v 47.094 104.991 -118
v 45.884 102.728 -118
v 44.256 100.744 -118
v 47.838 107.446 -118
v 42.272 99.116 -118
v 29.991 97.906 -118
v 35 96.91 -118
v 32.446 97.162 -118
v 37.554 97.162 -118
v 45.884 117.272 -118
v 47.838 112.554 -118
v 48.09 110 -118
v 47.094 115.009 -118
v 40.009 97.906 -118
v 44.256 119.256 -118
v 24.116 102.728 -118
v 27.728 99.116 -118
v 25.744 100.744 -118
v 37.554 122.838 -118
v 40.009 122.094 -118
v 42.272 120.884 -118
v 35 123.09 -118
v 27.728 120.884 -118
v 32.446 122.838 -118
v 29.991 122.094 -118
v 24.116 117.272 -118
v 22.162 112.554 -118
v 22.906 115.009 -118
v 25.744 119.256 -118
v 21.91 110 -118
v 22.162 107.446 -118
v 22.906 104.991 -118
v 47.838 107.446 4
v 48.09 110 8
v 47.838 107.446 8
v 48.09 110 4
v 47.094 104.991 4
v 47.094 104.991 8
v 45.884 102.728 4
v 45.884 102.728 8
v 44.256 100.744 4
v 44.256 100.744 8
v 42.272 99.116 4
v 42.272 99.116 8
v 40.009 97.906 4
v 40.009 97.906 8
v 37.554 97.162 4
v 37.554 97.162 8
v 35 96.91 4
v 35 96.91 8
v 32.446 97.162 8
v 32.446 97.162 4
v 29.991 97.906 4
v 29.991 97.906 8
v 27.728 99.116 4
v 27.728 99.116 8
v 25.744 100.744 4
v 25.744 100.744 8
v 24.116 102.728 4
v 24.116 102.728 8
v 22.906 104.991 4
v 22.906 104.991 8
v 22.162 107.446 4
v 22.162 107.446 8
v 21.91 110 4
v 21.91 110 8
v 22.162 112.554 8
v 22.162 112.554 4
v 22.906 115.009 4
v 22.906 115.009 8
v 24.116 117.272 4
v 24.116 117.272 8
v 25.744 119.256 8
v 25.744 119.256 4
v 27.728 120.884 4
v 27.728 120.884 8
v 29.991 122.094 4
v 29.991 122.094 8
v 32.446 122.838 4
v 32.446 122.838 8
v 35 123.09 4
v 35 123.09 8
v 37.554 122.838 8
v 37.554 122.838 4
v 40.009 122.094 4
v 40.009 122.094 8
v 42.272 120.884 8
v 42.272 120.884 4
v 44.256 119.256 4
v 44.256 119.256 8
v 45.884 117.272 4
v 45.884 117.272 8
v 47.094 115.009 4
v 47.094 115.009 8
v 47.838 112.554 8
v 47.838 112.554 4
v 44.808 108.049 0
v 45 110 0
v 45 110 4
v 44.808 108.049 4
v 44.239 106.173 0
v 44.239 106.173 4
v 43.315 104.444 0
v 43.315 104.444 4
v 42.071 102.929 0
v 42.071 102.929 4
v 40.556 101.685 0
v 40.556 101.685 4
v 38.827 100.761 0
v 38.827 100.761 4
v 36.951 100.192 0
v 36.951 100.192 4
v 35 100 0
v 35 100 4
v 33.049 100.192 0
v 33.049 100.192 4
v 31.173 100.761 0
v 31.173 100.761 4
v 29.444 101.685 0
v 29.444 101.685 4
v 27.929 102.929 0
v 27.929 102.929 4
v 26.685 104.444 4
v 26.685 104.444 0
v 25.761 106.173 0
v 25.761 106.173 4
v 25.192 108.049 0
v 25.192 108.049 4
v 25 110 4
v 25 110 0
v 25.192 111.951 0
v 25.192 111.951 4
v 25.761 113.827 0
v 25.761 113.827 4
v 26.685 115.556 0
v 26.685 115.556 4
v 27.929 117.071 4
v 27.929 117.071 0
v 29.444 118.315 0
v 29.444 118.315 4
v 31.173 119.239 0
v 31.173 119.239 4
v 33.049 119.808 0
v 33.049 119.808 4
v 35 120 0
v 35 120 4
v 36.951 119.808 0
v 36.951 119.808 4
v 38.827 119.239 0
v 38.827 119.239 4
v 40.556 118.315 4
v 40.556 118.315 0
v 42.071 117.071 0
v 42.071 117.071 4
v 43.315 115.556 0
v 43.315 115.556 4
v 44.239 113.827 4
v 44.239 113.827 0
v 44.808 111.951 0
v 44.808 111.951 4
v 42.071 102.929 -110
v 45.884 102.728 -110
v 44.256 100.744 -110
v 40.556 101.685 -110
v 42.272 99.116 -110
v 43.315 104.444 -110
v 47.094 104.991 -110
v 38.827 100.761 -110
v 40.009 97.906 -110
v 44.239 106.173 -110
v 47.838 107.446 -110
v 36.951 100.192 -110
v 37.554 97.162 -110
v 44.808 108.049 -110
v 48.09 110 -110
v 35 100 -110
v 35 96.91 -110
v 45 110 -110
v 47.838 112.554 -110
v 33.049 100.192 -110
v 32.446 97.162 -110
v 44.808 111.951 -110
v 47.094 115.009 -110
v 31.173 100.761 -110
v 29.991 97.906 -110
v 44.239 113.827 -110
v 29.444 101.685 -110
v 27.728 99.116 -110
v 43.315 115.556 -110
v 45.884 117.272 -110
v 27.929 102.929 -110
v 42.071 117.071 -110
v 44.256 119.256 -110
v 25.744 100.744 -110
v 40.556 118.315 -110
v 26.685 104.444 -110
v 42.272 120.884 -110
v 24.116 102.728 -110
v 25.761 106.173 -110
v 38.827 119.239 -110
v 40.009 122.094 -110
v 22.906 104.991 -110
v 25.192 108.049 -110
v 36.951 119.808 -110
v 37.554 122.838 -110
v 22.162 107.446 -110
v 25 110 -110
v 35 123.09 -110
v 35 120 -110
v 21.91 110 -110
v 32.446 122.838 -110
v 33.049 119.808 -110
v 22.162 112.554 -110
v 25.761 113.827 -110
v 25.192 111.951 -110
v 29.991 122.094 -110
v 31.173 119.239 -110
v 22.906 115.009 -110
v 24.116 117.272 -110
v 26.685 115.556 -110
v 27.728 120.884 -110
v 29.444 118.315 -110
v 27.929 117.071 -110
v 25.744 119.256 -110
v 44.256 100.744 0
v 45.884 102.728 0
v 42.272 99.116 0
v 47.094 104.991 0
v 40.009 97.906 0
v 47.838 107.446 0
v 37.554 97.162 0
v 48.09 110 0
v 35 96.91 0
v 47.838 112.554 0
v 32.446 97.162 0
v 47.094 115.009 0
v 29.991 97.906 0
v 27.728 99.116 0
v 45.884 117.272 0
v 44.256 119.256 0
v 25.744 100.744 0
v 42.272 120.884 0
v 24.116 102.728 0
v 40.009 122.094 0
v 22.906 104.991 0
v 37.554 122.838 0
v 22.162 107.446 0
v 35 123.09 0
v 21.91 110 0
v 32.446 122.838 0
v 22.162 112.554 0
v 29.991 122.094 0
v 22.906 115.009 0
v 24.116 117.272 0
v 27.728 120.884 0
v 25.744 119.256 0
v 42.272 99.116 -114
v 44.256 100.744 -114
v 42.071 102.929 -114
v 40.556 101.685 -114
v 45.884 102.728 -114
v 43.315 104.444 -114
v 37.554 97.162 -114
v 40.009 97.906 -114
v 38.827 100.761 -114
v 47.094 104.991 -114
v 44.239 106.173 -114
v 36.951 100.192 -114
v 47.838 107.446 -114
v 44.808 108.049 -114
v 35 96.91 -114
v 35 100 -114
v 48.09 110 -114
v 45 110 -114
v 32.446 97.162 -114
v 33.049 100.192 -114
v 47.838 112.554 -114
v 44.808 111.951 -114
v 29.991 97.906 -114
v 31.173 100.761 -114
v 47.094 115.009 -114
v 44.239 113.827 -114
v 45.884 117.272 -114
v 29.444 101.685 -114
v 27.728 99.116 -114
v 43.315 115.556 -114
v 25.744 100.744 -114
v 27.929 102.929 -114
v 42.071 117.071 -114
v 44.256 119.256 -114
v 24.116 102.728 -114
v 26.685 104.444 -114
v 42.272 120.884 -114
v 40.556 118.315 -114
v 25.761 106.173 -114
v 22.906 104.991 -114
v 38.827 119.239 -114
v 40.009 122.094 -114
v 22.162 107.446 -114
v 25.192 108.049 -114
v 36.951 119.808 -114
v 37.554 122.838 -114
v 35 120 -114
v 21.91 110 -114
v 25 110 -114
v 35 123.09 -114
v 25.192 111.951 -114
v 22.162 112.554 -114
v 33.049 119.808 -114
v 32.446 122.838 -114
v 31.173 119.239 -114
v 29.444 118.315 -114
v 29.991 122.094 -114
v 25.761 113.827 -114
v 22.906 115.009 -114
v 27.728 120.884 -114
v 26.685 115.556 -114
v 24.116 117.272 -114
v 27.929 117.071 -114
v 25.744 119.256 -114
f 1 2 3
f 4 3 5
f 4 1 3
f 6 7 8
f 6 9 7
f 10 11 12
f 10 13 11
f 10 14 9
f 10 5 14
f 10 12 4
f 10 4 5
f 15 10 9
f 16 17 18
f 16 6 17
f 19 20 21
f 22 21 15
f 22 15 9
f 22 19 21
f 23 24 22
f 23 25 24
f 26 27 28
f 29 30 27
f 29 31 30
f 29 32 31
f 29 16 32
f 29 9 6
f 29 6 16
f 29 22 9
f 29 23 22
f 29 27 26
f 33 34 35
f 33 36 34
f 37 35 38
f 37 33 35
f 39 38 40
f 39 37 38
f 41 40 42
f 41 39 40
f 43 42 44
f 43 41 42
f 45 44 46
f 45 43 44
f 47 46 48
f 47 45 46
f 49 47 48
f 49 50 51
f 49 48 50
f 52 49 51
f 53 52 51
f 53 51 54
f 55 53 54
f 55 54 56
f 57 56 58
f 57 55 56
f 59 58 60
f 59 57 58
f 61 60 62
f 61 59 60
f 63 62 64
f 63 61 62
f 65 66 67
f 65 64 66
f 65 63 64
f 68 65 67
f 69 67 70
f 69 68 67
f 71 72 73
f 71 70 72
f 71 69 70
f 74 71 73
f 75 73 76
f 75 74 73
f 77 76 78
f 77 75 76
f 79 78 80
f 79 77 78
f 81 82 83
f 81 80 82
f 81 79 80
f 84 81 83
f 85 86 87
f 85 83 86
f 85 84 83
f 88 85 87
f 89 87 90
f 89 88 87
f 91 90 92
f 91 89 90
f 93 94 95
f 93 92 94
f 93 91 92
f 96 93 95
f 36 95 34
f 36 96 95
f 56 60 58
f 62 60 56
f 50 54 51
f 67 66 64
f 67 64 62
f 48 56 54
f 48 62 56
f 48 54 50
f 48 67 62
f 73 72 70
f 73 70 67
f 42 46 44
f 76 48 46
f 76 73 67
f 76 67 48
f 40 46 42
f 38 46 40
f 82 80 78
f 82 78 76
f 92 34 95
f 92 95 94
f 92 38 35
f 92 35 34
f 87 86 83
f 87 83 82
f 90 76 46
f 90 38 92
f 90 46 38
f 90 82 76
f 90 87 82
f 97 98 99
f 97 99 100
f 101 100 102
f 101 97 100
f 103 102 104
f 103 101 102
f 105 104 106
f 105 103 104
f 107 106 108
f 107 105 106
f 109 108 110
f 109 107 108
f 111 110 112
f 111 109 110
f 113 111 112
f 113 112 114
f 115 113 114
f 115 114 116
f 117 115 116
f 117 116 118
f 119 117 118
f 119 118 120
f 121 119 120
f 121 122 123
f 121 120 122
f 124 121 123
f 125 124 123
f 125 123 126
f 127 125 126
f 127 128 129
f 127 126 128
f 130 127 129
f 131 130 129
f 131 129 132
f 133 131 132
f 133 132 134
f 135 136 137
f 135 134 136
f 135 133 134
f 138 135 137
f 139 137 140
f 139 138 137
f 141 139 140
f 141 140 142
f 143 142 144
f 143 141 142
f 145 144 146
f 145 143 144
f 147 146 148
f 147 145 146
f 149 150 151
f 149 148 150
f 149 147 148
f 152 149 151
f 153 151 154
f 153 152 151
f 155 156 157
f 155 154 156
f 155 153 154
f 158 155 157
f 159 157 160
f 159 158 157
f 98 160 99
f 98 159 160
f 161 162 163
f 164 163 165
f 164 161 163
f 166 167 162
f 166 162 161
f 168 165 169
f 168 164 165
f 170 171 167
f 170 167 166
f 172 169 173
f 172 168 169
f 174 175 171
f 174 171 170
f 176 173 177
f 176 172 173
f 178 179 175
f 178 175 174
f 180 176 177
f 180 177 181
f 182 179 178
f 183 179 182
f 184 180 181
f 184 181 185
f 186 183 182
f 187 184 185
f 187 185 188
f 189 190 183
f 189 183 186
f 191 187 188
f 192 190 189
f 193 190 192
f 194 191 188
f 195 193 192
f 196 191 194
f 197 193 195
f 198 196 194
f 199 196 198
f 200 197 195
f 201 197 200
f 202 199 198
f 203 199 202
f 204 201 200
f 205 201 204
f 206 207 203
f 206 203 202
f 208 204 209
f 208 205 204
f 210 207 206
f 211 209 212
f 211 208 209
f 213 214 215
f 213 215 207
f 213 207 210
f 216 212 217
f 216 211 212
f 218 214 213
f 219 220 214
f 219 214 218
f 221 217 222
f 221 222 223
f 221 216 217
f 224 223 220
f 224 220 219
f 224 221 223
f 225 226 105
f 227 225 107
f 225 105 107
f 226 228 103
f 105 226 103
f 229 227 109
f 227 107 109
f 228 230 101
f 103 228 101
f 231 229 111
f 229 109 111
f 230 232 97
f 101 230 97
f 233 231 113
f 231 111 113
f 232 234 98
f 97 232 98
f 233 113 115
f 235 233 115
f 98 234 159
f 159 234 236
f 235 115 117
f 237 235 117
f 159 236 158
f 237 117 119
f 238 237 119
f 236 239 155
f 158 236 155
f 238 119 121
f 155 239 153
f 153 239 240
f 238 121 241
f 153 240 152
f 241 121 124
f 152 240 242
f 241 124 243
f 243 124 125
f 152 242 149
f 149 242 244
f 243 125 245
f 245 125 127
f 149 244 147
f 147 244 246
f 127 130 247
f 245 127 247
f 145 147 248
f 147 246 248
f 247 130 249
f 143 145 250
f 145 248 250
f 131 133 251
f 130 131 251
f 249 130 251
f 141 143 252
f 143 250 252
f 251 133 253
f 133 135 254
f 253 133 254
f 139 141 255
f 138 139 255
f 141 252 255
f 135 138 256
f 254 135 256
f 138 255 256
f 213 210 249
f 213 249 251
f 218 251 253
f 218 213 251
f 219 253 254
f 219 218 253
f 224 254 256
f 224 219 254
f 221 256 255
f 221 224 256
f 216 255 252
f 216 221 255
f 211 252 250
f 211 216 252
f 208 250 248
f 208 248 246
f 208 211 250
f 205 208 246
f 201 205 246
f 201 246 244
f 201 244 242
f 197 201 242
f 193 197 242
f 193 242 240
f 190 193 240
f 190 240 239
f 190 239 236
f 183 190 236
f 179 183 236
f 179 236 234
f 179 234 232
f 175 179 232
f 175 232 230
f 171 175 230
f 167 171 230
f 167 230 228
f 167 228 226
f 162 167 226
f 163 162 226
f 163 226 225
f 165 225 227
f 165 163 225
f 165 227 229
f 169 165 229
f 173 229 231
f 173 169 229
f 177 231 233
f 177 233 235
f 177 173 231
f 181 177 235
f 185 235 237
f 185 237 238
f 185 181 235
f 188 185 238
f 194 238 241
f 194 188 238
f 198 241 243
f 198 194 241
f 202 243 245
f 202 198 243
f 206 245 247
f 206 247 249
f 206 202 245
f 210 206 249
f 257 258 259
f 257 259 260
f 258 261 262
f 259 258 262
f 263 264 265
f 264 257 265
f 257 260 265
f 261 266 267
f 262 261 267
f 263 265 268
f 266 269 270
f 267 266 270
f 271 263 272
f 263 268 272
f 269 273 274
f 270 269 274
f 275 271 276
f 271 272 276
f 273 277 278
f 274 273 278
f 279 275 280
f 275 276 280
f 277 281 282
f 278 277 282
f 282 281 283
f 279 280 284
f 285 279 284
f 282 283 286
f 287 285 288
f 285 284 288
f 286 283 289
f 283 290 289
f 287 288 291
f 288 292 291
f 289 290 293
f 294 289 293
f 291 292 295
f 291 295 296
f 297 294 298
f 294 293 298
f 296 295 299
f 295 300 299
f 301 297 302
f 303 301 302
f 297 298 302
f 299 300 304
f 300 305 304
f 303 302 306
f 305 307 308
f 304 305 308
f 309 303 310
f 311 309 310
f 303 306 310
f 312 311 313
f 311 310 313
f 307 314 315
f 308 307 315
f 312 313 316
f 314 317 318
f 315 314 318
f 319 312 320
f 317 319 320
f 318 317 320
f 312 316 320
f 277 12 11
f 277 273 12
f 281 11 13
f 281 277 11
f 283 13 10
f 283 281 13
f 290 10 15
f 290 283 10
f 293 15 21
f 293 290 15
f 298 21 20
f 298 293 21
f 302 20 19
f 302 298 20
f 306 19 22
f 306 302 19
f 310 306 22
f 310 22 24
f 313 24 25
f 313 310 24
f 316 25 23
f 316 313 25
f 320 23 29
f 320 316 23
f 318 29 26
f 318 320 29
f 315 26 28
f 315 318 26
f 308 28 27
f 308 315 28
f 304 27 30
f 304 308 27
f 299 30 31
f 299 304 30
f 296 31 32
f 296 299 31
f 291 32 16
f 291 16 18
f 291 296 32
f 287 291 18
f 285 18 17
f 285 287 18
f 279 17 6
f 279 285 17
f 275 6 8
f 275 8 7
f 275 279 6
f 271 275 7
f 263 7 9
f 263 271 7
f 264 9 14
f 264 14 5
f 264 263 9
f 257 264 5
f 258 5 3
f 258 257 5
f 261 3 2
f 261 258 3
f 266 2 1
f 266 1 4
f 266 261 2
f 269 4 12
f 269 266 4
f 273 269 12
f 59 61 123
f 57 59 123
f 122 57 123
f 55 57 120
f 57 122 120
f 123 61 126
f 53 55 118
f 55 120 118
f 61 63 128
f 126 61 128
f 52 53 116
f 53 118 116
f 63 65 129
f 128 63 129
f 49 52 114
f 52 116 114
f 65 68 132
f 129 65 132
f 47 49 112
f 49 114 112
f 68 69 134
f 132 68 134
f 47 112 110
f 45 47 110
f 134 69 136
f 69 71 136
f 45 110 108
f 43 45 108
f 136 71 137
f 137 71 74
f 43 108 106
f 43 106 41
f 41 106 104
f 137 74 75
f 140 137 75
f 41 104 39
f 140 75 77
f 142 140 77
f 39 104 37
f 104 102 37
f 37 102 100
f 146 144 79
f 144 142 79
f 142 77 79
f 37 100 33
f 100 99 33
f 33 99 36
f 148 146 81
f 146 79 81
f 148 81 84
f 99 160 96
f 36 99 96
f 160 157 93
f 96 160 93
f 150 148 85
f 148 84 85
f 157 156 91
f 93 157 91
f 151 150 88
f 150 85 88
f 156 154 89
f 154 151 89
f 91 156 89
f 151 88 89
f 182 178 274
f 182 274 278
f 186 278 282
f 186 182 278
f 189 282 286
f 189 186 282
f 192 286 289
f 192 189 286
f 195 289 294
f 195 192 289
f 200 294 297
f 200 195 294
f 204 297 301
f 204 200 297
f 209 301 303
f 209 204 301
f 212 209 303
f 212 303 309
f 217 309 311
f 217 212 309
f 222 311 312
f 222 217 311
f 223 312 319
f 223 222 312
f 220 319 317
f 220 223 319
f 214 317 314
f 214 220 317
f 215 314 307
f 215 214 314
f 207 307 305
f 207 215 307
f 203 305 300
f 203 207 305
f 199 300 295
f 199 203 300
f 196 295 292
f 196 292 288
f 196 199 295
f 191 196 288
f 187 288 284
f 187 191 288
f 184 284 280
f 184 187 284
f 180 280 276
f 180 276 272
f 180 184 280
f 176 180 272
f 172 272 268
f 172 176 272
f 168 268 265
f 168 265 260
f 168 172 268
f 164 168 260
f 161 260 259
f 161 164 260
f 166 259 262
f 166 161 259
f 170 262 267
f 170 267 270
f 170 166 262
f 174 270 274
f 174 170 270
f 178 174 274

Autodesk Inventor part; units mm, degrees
ref_plane "YZ Plane" through (0, 0, 0) normal (1, 0, 0) x (0, 1, 0)
ref_plane "XZ Plane" through (0, 0, 0) normal (0, 1, 0) x (-1, 0, 0)
ref_plane "Work Plane1" through (70, 0, -110) normal (0, 0, -1) x (-1, 0, 0)
sketch "Sketch1" plane through (70, 0, -110) normal (0, 0, -1) x (-1, 0, 0)
  circle A0 centre (35, 110) radius 13.5 projected
  circle A1 centre (35, 110) radius 13.09
  point P0 (70, 0)
  dimension "d2" = 0.41
ref_plane "Work Plane2" through (-8, 0, 0) normal (0, 0, 1) x (1, 0, 0)
extrude "Extrusion1" add sketch "Sketch1" against normal up to surface (110 mm away) contours A1
sketch "Sketch2" plane through (35, 110, 0) normal (0, 0, 1) x (1, 0, 0)
  circle A0 centre (0, 0) radius 13.09 projected
  circle A1 centre (0, 0) radius 10
  point P0 (-35, -110)
  dimension "d3" = 20
extrude "Extrusion2" add sketch "Sketch2" along normal blind 4 contours A1
sketch "Sketch3" plane through (35, 110, 4) normal (0, 0, 1) x (1, 0, 0)
  circle A0 centre (0, 0) radius 13.09 projected
  point P0 (-35, -110)
extrude "Extrusion3" add sketch "Sketch3" along normal blind 4
ref_plane "Work Plane3" through (35, 110, -55) normal (0, 0, 1) x (1, 0, 0)
mirror "Mirror1" about plane through (35, 110, -55) normal (0, 0, 1) of "Extrusion2", "Extrusion3"
equation "\"BendRadius\" = Thickness"
equation "\"BendReliefWidth\" = Thickness"
equation "\"BendReliefDepth\" = 0.5 * Thickness"
equation "\"CornerReliefSize\" = 4 * Thickness"
equation "\"MinimumRemnant\" = 2 * Thickness"
equation "\"TransitionRadius\" = BendRadius"
equation "\"JacobiRadiusSize\" = BendRadius"
equation "\"GapSize\" = Thickness"
equation "\"Thickness\" = 3.048"
properties part number "axle_3DPrint"
